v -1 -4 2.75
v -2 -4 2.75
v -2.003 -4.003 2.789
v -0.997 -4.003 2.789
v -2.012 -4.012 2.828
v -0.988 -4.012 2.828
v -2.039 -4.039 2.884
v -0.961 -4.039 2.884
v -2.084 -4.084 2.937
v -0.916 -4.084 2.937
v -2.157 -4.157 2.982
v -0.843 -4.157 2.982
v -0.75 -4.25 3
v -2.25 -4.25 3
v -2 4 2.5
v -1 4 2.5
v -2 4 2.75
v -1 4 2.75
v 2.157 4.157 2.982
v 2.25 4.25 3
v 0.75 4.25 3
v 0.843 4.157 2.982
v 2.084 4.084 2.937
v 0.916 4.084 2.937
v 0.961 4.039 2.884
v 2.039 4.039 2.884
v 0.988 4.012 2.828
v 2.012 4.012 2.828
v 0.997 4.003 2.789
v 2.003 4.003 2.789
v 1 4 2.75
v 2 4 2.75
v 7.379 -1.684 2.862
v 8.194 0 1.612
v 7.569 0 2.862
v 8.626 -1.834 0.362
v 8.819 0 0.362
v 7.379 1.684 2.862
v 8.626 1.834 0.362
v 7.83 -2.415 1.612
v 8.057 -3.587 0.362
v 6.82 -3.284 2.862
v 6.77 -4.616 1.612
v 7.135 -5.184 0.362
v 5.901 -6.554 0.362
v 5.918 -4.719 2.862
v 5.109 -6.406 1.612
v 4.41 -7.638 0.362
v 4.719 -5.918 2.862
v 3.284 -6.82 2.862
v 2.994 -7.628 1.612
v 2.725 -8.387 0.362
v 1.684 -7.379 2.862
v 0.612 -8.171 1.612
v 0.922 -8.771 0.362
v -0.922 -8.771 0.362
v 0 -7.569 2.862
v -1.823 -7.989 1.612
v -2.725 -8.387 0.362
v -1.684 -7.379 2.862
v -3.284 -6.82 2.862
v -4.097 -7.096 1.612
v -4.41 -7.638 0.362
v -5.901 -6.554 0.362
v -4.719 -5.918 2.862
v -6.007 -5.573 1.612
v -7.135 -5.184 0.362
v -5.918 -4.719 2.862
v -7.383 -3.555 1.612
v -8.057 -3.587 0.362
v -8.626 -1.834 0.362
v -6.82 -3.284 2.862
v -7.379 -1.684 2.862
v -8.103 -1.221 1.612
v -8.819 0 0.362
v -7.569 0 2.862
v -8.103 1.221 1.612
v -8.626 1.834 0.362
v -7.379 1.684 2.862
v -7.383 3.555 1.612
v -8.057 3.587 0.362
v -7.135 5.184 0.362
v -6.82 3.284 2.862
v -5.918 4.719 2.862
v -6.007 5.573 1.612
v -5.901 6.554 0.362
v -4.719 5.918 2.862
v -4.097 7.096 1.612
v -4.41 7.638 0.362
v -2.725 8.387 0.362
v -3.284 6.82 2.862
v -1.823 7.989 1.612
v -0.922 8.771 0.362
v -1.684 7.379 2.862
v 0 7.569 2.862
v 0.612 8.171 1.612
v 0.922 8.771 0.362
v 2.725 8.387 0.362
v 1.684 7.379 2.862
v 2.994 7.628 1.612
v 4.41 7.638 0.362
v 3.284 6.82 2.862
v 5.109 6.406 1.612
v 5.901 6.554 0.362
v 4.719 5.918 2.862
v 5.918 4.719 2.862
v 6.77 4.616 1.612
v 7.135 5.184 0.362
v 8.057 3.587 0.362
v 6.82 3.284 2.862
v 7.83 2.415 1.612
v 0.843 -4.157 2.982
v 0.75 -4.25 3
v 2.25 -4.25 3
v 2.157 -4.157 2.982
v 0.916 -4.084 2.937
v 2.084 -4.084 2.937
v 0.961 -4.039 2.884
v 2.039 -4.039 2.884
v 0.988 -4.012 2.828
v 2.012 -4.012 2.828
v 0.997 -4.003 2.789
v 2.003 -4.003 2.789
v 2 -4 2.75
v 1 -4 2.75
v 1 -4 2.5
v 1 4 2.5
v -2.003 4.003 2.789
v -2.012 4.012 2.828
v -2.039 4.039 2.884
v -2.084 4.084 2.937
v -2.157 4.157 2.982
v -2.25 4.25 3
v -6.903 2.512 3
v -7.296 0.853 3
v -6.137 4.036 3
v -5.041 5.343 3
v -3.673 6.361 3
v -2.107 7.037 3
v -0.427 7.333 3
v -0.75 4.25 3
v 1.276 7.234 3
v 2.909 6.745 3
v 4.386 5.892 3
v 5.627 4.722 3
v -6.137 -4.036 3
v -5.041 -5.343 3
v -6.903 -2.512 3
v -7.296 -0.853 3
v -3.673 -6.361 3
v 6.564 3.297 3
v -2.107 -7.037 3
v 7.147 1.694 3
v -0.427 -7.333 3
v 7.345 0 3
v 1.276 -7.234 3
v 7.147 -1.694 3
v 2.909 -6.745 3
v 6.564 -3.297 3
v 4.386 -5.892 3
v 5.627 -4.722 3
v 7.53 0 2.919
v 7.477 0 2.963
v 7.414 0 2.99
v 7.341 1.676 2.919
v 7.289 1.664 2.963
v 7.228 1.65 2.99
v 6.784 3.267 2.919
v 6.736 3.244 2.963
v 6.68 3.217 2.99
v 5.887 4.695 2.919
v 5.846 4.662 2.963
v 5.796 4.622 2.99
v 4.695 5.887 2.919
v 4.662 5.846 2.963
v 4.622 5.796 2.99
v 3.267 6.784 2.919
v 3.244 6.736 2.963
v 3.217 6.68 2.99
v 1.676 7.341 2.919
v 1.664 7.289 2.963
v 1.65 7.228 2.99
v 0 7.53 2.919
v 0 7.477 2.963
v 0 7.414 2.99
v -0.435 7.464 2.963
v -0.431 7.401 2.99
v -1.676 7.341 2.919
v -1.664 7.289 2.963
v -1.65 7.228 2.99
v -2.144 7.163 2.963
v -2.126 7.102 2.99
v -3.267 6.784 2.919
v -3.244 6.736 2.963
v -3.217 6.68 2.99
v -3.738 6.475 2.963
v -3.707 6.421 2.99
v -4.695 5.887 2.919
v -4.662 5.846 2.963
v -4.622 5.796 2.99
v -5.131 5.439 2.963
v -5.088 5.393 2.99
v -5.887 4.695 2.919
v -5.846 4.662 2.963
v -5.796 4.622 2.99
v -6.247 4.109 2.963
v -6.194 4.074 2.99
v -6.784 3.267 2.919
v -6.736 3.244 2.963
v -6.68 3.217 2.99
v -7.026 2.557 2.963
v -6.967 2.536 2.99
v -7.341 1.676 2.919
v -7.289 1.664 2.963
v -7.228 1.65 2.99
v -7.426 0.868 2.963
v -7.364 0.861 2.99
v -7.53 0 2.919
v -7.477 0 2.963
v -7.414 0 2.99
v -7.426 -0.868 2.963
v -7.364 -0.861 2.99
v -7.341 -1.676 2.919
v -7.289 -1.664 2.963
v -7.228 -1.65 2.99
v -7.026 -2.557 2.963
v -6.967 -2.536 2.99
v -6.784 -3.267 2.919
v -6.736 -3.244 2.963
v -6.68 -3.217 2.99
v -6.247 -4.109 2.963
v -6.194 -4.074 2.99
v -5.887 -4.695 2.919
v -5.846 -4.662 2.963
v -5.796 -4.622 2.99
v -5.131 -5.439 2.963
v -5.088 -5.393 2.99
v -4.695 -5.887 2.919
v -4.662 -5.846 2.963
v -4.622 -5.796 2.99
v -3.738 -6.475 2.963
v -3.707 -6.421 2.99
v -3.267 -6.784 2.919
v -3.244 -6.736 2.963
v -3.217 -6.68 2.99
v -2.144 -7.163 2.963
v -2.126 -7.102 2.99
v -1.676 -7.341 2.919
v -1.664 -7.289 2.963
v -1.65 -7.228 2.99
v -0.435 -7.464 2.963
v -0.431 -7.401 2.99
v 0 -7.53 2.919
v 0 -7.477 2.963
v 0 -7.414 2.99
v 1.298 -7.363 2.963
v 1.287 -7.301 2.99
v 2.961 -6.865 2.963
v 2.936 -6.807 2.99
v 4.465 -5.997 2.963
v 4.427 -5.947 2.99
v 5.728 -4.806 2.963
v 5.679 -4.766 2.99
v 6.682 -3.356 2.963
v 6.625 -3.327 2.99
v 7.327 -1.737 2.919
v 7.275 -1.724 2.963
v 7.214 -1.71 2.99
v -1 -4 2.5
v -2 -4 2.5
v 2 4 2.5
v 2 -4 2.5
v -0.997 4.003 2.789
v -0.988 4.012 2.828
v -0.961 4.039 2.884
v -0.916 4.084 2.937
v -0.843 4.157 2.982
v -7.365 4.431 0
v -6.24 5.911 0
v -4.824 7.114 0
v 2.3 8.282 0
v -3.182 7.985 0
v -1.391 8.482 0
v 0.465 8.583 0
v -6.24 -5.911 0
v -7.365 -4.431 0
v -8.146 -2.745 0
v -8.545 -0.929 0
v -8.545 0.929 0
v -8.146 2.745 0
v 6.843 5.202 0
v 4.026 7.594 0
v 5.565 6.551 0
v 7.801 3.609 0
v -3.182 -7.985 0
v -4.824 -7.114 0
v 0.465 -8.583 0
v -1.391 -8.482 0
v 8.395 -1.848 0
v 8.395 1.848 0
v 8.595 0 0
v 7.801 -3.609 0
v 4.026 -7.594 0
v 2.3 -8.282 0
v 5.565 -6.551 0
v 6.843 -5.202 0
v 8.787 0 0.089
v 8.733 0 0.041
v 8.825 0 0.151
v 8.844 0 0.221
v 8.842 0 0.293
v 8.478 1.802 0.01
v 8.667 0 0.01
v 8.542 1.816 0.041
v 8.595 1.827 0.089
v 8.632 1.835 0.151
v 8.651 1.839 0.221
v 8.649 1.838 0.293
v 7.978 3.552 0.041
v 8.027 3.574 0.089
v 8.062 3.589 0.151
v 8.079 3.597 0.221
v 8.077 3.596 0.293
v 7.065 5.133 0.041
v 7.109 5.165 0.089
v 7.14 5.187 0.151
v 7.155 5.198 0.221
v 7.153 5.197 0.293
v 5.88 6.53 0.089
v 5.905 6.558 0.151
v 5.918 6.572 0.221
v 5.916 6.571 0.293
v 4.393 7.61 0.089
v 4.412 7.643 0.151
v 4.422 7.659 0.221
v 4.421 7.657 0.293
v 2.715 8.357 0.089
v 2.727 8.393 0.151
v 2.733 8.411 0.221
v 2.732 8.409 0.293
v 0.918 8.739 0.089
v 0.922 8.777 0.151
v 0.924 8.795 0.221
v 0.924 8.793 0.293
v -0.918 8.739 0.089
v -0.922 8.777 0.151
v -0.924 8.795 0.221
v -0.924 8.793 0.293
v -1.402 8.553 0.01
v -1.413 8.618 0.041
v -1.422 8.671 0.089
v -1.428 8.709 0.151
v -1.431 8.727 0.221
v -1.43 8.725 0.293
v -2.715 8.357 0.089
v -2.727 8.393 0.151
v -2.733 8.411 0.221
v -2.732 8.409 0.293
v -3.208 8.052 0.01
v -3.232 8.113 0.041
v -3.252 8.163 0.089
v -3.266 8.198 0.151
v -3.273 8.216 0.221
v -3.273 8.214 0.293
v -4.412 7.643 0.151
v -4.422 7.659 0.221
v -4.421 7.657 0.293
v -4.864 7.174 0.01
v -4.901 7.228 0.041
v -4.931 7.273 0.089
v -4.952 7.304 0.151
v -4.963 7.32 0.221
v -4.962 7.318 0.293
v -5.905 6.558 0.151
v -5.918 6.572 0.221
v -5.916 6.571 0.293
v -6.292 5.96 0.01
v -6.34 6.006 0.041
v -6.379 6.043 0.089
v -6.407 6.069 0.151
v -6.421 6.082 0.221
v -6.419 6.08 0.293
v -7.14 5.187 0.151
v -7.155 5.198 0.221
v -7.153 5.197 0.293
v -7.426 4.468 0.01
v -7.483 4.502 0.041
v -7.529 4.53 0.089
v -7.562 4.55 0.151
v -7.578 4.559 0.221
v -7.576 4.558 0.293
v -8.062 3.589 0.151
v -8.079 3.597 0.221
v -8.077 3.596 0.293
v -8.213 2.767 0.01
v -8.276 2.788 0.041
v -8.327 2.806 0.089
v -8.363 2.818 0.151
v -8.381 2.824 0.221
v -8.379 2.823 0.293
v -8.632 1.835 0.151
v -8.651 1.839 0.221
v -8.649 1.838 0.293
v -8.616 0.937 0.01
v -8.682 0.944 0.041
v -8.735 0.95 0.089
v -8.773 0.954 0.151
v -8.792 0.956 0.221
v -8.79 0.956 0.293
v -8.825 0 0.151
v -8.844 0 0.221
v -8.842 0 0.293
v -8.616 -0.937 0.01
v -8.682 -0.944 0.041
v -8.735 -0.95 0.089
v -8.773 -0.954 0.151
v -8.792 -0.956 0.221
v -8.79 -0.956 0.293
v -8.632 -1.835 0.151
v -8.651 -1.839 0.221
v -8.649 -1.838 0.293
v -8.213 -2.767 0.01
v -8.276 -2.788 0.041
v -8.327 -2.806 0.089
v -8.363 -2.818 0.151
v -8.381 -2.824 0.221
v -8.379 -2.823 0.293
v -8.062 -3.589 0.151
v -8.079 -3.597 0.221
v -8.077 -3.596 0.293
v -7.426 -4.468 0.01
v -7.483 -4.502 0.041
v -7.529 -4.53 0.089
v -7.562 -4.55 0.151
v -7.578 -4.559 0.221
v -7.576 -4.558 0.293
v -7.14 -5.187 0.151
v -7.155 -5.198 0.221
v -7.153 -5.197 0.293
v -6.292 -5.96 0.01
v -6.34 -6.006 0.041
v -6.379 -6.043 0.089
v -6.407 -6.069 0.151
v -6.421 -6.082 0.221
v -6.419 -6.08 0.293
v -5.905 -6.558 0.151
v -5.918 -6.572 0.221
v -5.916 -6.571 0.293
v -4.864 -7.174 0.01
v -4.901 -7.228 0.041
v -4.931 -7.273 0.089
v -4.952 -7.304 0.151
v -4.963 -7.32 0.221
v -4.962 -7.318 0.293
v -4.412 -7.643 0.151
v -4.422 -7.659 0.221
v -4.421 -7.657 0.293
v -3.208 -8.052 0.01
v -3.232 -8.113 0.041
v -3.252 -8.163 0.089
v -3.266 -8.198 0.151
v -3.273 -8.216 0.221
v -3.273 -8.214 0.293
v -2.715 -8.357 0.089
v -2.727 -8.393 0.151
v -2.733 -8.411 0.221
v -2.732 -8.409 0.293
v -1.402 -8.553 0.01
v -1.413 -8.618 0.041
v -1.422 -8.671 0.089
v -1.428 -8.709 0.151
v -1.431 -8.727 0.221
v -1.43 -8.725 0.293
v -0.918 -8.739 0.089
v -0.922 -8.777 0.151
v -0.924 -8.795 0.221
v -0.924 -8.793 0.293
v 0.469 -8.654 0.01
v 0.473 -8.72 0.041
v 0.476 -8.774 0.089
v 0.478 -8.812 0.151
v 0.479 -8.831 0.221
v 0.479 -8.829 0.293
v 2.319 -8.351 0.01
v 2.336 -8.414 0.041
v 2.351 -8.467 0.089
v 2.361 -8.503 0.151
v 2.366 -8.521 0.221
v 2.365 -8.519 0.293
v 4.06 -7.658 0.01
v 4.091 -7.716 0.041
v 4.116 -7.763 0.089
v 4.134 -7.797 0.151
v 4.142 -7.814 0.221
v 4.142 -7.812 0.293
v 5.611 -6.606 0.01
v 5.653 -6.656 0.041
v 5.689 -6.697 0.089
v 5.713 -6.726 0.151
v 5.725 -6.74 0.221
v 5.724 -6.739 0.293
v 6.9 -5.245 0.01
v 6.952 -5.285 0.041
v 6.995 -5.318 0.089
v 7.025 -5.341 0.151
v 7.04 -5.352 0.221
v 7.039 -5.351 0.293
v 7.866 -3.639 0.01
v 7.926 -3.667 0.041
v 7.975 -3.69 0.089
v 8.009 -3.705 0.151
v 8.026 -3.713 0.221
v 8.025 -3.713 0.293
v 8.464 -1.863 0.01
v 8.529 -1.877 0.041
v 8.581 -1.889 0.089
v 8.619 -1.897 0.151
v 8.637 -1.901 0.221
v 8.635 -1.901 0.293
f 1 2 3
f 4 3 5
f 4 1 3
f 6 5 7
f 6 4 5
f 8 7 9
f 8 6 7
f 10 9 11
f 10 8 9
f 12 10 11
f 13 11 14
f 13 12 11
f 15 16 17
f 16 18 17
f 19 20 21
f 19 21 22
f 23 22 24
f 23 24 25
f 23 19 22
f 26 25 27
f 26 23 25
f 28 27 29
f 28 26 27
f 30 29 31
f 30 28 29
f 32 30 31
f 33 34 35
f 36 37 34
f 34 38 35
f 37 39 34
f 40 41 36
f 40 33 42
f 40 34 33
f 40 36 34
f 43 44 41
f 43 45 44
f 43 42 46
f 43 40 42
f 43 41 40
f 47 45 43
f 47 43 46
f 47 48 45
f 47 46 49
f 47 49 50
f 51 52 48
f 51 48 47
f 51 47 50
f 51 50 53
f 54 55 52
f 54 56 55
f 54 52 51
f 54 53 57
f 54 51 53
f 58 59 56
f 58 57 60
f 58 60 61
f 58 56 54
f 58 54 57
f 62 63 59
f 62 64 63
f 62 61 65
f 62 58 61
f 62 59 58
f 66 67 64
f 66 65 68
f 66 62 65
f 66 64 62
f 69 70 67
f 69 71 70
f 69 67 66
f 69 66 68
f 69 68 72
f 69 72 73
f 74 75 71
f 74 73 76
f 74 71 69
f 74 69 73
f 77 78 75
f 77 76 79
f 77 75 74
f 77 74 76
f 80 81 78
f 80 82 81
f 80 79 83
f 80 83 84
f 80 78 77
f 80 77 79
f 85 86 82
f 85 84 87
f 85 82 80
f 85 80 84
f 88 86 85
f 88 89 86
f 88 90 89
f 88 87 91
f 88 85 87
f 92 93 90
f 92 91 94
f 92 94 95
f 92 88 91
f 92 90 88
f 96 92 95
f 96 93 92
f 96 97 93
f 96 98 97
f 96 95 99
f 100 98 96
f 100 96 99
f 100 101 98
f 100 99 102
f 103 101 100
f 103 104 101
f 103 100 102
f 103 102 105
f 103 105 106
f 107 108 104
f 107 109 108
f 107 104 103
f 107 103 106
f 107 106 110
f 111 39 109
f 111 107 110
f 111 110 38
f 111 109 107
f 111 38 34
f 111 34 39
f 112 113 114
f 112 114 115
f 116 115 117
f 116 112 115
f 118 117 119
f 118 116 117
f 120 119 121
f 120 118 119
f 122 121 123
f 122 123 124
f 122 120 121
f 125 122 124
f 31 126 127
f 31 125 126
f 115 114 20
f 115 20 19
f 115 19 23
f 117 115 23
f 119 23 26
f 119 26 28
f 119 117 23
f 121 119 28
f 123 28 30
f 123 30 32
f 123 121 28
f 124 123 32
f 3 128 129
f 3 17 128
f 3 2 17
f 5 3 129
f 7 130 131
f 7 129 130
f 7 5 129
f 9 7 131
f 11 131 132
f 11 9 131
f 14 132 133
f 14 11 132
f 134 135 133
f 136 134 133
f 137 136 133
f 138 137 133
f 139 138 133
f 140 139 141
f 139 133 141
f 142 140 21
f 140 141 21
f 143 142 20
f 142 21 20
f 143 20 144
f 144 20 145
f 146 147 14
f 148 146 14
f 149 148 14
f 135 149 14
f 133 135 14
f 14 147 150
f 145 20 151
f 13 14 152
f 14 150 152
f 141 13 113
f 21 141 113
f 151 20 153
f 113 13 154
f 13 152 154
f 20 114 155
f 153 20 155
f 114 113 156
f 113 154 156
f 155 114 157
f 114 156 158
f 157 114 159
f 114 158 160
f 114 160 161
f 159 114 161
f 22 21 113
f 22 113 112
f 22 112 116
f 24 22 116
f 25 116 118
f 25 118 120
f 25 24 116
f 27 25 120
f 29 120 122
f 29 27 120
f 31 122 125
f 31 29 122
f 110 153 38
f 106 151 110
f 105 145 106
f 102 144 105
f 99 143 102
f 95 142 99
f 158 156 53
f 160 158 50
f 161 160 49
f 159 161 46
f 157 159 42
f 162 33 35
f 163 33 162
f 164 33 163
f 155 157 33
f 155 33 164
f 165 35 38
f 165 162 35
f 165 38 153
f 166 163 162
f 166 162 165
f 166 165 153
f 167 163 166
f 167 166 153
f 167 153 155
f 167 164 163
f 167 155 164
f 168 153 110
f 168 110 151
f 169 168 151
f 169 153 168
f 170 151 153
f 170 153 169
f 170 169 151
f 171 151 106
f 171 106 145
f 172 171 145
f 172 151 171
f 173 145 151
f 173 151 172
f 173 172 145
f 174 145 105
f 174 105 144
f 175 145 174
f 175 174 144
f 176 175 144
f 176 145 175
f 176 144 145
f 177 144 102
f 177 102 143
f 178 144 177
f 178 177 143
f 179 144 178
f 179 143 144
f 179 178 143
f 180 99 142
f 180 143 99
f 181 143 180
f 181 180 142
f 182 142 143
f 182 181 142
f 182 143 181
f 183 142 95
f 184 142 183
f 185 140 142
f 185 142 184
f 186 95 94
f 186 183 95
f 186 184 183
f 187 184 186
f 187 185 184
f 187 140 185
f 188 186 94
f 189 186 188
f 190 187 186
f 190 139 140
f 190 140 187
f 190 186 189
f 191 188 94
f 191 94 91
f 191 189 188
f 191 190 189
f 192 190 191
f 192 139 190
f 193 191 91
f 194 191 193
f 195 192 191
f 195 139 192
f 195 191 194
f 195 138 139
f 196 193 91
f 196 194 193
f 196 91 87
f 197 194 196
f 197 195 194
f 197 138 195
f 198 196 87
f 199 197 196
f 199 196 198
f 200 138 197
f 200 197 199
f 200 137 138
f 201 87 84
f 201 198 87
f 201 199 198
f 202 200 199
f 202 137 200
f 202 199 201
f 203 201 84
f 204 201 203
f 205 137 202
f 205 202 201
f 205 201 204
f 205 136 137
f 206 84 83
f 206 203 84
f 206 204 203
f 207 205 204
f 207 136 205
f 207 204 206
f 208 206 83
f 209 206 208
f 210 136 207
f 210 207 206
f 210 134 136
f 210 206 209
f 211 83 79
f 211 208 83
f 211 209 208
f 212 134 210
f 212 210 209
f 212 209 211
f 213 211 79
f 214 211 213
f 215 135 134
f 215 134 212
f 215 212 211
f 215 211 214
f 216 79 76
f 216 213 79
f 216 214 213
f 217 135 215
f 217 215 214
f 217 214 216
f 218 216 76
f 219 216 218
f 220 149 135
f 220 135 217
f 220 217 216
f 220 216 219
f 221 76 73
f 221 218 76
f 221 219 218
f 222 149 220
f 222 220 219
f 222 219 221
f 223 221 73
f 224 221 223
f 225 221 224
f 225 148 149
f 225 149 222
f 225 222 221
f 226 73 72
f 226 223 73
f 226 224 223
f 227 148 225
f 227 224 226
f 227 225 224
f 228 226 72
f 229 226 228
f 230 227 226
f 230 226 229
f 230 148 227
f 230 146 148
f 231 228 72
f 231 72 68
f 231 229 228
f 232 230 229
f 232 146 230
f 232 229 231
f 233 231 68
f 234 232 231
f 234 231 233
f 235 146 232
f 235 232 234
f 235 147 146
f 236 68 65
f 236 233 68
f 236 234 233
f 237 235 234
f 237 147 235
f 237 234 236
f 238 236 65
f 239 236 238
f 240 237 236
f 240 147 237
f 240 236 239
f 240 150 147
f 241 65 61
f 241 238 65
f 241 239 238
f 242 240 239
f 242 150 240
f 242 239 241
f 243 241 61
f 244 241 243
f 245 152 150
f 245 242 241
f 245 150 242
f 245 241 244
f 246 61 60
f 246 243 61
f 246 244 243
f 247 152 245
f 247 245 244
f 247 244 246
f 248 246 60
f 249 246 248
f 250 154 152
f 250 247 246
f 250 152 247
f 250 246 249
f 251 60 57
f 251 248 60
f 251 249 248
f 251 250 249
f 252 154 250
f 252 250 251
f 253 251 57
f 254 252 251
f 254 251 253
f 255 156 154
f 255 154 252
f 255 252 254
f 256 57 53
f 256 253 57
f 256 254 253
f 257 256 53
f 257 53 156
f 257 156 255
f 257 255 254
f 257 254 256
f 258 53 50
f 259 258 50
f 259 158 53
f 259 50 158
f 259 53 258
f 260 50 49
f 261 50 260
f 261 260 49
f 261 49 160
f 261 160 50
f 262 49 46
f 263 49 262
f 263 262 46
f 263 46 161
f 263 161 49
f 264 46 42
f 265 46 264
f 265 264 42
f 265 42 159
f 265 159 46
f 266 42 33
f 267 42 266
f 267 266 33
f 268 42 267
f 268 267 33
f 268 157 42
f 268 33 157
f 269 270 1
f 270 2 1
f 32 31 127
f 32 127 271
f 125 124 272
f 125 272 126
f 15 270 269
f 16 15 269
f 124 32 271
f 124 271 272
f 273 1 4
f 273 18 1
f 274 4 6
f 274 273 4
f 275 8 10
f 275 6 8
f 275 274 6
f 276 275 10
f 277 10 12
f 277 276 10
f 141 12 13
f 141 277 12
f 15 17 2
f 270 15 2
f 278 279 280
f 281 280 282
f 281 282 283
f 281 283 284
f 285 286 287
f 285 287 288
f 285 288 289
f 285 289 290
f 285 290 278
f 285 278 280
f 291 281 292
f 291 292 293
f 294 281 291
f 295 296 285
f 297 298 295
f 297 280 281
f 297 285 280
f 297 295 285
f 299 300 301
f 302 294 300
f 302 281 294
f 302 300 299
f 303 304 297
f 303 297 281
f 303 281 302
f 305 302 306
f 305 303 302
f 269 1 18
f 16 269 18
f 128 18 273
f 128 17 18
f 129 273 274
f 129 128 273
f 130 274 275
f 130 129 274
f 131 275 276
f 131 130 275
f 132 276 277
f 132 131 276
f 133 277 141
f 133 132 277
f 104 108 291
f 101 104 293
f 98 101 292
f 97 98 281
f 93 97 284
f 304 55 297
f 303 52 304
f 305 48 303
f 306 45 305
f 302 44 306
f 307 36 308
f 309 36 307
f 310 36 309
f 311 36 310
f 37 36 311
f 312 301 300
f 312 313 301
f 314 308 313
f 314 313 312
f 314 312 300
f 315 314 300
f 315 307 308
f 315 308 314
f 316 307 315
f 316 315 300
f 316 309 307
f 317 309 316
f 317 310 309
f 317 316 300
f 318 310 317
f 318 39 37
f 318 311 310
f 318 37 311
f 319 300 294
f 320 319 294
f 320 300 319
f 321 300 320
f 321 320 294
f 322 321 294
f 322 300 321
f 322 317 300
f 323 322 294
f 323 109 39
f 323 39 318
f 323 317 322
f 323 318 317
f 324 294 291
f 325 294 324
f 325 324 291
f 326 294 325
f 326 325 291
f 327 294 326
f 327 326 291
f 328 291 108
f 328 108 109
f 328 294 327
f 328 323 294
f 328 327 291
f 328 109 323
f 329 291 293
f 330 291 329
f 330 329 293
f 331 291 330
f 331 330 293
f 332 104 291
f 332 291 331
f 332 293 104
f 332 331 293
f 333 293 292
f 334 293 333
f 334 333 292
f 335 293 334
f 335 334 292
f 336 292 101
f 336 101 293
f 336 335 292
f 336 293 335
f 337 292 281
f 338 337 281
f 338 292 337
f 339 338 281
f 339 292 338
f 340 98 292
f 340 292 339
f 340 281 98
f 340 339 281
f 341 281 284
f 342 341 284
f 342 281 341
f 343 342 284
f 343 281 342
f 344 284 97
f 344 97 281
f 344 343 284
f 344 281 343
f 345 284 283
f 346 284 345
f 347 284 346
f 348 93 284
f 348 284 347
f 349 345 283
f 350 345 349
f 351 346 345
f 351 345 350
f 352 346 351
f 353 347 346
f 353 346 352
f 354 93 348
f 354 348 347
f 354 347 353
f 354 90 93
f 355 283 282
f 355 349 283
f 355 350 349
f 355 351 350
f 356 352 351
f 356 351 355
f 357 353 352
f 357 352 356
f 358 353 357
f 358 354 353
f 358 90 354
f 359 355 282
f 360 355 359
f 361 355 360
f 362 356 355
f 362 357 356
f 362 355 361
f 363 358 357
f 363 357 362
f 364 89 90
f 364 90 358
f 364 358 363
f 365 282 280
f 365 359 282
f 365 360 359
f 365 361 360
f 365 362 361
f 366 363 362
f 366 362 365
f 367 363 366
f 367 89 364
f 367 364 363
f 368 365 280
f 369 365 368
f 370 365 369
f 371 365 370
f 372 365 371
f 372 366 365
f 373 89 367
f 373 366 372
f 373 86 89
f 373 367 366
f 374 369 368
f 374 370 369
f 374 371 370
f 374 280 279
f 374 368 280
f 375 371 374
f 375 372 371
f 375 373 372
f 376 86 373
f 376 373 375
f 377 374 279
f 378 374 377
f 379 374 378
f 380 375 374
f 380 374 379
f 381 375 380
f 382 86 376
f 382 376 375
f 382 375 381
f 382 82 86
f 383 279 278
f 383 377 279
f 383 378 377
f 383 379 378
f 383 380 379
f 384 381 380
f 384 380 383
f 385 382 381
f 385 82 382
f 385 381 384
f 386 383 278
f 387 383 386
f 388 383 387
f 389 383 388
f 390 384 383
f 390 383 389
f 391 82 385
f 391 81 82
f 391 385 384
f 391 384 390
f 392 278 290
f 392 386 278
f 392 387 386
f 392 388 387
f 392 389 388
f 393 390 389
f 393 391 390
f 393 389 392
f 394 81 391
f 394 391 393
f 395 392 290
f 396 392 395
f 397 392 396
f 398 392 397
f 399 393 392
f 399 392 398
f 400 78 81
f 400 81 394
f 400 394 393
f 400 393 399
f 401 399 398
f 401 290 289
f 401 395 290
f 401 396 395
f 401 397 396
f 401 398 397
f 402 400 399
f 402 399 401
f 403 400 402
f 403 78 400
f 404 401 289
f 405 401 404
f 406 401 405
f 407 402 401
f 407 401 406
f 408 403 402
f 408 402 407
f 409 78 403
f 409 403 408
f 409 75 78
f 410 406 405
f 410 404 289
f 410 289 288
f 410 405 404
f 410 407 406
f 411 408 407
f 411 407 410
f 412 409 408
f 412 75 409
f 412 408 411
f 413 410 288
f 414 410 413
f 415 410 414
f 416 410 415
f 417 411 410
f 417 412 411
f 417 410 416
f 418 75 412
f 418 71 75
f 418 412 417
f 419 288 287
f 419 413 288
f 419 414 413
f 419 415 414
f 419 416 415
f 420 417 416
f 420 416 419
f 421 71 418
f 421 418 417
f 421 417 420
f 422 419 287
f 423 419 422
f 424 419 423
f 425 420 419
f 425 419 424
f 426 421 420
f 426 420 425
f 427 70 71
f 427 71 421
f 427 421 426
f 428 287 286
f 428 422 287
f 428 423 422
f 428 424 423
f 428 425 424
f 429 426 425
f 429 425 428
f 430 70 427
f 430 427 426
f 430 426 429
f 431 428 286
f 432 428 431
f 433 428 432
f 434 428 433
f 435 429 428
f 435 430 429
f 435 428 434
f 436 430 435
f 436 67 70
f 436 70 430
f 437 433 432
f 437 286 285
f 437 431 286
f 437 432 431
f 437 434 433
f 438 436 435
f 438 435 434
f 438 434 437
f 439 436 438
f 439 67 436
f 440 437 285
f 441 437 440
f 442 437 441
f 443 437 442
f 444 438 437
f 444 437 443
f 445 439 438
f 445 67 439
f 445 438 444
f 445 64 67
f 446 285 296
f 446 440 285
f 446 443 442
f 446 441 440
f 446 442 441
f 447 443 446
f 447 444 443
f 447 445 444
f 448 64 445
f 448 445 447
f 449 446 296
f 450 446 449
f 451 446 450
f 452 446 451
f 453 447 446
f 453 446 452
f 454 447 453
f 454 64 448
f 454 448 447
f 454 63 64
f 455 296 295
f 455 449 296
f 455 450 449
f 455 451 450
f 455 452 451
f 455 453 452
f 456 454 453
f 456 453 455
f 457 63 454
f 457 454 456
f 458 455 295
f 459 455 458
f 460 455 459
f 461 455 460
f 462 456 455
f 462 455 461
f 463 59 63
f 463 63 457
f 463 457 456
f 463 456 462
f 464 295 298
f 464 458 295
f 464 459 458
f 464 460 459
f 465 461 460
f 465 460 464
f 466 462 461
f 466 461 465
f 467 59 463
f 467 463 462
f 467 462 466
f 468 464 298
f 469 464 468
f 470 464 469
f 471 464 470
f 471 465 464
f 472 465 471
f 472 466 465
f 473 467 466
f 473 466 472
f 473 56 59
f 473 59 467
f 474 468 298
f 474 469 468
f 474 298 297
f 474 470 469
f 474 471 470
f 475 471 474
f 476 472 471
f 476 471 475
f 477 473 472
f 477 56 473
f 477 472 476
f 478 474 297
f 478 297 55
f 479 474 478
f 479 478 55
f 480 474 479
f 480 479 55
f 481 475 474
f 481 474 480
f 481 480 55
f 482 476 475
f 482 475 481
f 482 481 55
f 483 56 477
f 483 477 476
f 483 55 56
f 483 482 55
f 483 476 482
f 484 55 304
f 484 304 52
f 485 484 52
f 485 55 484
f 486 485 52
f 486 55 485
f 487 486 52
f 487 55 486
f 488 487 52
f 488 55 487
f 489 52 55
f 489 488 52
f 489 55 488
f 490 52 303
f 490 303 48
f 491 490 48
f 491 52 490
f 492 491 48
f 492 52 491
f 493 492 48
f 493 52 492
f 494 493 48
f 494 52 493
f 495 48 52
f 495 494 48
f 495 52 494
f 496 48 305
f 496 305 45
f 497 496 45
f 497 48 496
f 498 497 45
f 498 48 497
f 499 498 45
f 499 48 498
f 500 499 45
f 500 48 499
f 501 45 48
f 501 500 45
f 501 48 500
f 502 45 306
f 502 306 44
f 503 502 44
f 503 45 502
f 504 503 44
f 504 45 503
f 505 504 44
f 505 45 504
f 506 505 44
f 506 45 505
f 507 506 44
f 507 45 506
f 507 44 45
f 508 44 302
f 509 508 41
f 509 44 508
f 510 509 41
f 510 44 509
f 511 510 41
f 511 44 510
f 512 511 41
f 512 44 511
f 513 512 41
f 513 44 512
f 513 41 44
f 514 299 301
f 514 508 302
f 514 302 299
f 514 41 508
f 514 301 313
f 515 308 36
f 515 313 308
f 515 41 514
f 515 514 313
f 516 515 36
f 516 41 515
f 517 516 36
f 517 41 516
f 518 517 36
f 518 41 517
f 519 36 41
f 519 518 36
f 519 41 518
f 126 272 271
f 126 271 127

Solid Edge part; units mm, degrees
sketch "Sketch1" plane through (0, 0, 0) normal (0, -1, 0) x (1, 0, 0)
  line L0 (0, 0) -> (9, 0)
  line L1 (9, 0) -> (7.5, 3)
  line L2 (7.5, 3) -> (0, 3)
  dimension "D1" = 9
  dimension "D2" = 3
  dimension "D3" = 7.5
revolve "RevolvedProtrusion1" add sketch "Sketch1" angle 360 about axis through (0, 0, 3) along (0, 0, -1)
sketch "Sketch2" plane through (0, 0, 3) normal (0, 0, 1) x (1, 0, 0)
  line L0 (-2, -4) -> (-1, -4)
  line L1 (-1, -4) -> (-1, 4)
  line L2 (-1, 4) -> (-2, 4)
  line L3 (-2, 4) -> (-2, -4)
  line L4 (2, -4) -> (1, -4)
  line L5 (1, -4) -> (1, 4)
  line L6 (1, 4) -> (2, 4)
  line L7 (2, 4) -> (2, -4)
  dimension "D1" = 1
  dimension "D2" = 8
  dimension "D3" = 2
  dimension "D4" = 1
extrude "Cutout1" cut sketch "Sketch2" against normal blind 0.5
fillet "main_rounds" radius 0.25 10 edges at (1.5, 4, 3) (2, 0, 3) (-1.5, 4, 3) (-2, 0, 3) (-1, 0, 3) (-1.5, -4, 3) (1, 0, 3) (1.5, -4, 3) (-9, 0, 0) (-7.5, 0, 3)
properties material "Polyethylene, low density"
